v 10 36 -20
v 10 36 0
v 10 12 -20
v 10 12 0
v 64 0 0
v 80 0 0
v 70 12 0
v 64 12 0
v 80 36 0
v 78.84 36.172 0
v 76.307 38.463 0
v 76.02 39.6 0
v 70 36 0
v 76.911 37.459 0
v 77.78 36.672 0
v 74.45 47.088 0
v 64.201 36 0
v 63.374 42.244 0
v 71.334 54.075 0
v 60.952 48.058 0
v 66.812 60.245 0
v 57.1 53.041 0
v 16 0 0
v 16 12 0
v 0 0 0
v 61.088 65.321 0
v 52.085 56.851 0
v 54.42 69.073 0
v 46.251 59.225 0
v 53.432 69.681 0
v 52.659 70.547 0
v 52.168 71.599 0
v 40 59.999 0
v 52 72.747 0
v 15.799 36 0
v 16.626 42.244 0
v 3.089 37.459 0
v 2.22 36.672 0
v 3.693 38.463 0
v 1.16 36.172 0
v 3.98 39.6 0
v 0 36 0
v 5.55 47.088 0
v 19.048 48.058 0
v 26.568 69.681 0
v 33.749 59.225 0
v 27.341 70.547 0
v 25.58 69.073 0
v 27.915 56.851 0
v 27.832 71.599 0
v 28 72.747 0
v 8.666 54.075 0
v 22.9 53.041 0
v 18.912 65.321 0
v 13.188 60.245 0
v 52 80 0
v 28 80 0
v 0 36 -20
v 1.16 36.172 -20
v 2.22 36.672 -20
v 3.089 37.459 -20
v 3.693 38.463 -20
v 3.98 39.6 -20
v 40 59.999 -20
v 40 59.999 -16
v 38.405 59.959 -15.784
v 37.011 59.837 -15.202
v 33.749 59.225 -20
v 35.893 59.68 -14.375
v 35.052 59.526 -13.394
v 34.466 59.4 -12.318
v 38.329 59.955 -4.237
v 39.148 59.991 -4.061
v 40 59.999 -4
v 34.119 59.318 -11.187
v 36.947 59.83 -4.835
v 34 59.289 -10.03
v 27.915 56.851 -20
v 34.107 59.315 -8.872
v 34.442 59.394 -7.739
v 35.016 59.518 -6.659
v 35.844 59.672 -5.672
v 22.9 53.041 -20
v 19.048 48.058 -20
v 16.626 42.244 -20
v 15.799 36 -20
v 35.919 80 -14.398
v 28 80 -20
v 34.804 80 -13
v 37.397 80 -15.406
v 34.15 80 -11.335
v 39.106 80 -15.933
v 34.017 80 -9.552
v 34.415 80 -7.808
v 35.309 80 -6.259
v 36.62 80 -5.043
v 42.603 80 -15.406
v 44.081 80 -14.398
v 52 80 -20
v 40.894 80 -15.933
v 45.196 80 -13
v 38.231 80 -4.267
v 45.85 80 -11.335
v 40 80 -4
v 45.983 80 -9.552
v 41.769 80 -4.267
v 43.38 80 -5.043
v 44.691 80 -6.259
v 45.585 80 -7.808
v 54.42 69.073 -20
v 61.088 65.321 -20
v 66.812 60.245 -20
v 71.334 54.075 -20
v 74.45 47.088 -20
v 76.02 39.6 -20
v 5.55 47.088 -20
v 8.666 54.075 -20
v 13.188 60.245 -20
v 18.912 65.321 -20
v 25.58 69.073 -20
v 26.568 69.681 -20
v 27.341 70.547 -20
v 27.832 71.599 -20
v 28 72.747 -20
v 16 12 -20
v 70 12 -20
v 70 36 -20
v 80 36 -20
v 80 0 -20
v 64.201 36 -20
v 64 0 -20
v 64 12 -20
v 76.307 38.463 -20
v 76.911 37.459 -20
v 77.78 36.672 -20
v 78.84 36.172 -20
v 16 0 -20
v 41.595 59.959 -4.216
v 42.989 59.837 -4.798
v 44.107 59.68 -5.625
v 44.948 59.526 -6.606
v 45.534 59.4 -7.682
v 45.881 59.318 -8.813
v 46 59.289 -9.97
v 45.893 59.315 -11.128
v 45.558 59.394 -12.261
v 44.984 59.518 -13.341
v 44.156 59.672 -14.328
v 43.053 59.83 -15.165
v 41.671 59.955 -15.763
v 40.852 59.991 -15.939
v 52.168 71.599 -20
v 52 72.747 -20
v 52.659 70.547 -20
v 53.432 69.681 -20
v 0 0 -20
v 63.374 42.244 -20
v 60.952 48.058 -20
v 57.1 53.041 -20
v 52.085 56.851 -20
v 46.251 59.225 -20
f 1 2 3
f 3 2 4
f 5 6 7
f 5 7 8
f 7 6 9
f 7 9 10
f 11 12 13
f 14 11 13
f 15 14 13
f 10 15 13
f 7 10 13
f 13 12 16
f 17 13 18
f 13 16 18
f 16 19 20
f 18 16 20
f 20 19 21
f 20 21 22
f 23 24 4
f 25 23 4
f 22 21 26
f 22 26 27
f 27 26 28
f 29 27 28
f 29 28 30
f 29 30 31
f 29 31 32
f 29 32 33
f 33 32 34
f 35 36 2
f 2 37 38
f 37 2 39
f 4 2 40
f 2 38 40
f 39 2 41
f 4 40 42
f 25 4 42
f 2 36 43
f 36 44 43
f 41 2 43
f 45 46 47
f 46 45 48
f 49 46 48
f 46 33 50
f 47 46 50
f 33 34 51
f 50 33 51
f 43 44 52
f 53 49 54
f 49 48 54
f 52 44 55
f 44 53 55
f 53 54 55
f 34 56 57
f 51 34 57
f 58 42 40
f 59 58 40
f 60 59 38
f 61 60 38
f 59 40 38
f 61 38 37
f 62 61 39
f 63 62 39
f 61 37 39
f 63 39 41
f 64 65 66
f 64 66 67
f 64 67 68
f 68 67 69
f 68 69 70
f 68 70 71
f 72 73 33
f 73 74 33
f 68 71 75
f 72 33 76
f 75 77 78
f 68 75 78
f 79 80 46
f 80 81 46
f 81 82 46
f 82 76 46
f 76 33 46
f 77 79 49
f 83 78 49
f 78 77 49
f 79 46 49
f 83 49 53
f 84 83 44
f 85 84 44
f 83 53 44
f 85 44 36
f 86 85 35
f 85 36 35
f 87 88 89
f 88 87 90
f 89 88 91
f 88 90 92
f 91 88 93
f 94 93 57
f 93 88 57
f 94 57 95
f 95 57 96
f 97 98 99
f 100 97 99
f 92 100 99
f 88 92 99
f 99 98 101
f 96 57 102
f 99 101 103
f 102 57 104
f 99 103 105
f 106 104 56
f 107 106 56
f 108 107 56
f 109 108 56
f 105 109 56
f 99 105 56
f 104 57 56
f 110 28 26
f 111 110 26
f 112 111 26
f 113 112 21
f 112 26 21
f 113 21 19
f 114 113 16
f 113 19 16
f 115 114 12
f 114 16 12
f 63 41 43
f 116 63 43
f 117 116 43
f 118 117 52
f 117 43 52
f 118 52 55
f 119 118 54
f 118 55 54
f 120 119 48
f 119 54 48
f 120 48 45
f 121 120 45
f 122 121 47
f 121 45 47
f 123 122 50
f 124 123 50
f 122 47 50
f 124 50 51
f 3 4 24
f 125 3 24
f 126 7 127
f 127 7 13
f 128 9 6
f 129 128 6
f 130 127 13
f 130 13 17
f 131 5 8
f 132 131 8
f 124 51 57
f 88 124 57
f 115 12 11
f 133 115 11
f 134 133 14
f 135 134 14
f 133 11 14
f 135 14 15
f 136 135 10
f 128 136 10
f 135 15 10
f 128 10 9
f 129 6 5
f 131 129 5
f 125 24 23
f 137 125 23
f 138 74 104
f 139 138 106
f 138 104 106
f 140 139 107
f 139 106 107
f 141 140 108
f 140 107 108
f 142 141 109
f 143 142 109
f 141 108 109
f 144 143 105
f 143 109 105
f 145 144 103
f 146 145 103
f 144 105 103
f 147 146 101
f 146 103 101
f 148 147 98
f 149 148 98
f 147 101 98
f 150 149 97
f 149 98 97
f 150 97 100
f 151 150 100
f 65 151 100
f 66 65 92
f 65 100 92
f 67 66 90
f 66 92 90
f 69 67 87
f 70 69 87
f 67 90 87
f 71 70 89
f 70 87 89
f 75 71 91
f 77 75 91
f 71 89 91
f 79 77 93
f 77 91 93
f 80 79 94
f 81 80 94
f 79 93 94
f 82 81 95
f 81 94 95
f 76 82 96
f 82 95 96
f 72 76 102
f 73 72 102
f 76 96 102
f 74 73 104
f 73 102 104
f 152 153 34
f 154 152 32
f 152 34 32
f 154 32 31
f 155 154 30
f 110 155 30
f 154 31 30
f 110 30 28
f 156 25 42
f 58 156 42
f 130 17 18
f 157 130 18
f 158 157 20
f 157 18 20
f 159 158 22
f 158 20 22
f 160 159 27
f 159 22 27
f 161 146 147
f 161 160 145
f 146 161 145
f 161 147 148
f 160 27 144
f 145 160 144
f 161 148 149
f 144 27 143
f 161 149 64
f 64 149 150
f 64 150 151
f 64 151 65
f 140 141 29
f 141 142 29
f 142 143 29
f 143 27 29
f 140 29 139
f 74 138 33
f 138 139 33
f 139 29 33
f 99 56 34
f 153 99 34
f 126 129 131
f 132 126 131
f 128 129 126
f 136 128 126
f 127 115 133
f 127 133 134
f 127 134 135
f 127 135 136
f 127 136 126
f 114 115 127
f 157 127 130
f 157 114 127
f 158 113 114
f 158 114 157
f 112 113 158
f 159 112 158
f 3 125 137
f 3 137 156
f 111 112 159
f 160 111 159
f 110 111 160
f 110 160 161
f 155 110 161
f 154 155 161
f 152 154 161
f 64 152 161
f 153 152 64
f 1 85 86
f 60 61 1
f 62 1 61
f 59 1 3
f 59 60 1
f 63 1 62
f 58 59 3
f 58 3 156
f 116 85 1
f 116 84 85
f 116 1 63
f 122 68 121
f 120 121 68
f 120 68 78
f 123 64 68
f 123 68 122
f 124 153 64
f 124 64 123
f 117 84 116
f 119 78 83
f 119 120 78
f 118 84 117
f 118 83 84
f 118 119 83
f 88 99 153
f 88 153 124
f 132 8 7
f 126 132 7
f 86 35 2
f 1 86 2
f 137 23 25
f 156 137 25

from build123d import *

# Parameters (mm, degrees)
BOSS_EXTRUDE1_DEPTH = 20
SKETCH3_R           = 6
CUT_EXTRUDE1_DEPTH  = 115.891252931


with BuildPart() as part:
    # Sketch2 → Boss-Extrude1 (new body)
    with BuildSketch(Plane.XY):
        with BuildLine():
            Line((28, 72.747460854), (28, 80))
            Line((28, 80), (52, 80))
            Line((52, 80), (52, 72.747460854))
            ThreePointArc((52, 72.747460854), (52.659356425, 70.547438013), (54.420050252, 69.072714769))
            ThreePointArc((54.420050252, 69.072714769), (69.23734115, 57.280554554), (76.020050252, 39.6))
            ThreePointArc((76.020050252, 39.6), (77.316718427, 37.033520605), (80, 36))
            Line((80, 36), (80, 0))
            Line((80, 0), (64, 0))
            Line((64, 0), (64, 12))
            Line((64, 12), (70, 12))
            Line((70, 12), (70, 36))
            Line((70, 36), (64.200502516, 36))
            ThreePointArc((64.200502516, 36), (57.100028243, 53.041303653), (40, 59.999162459))
            ThreePointArc((40, 59.999162459), (22.899971757, 53.041303653), (15.799497484, 36))
            Line((15.799497484, 36), (10, 36))
            Line((10, 36), (10, 12))
            Line((10, 12), (16, 12))
            Line((16, 12), (16, 0))
            Line((16, 0), (0, 0))
            Line((0, 0), (0, 36))
            ThreePointArc((0, 36), (2.683281573, 37.033520605), (3.979949748, 39.6))
            ThreePointArc((3.979949748, 39.6), (10.76265885, 57.280554554), (25.579949748, 69.072714769))
            ThreePointArc((25.579949748, 69.072714769), (27.340643575, 70.547438013), (28, 72.747460854))
        make_face()
    extrude(amount=-BOSS_EXTRUDE1_DEPTH)

    # Sketch3 → Cut-Extrude1 (cut, through all)
    with BuildSketch(Plane(origin=(0, 80, 0), x_dir=(1, 0, 0), z_dir=(0, 1, 0))):
        with Locations(Location((40, 10, 0), (0, 0, 270))):
            Circle(SKETCH3_R)
    extrude(amount=-CUT_EXTRUDE1_DEPTH, mode=Mode.SUBTRACT)


solid = part.part
